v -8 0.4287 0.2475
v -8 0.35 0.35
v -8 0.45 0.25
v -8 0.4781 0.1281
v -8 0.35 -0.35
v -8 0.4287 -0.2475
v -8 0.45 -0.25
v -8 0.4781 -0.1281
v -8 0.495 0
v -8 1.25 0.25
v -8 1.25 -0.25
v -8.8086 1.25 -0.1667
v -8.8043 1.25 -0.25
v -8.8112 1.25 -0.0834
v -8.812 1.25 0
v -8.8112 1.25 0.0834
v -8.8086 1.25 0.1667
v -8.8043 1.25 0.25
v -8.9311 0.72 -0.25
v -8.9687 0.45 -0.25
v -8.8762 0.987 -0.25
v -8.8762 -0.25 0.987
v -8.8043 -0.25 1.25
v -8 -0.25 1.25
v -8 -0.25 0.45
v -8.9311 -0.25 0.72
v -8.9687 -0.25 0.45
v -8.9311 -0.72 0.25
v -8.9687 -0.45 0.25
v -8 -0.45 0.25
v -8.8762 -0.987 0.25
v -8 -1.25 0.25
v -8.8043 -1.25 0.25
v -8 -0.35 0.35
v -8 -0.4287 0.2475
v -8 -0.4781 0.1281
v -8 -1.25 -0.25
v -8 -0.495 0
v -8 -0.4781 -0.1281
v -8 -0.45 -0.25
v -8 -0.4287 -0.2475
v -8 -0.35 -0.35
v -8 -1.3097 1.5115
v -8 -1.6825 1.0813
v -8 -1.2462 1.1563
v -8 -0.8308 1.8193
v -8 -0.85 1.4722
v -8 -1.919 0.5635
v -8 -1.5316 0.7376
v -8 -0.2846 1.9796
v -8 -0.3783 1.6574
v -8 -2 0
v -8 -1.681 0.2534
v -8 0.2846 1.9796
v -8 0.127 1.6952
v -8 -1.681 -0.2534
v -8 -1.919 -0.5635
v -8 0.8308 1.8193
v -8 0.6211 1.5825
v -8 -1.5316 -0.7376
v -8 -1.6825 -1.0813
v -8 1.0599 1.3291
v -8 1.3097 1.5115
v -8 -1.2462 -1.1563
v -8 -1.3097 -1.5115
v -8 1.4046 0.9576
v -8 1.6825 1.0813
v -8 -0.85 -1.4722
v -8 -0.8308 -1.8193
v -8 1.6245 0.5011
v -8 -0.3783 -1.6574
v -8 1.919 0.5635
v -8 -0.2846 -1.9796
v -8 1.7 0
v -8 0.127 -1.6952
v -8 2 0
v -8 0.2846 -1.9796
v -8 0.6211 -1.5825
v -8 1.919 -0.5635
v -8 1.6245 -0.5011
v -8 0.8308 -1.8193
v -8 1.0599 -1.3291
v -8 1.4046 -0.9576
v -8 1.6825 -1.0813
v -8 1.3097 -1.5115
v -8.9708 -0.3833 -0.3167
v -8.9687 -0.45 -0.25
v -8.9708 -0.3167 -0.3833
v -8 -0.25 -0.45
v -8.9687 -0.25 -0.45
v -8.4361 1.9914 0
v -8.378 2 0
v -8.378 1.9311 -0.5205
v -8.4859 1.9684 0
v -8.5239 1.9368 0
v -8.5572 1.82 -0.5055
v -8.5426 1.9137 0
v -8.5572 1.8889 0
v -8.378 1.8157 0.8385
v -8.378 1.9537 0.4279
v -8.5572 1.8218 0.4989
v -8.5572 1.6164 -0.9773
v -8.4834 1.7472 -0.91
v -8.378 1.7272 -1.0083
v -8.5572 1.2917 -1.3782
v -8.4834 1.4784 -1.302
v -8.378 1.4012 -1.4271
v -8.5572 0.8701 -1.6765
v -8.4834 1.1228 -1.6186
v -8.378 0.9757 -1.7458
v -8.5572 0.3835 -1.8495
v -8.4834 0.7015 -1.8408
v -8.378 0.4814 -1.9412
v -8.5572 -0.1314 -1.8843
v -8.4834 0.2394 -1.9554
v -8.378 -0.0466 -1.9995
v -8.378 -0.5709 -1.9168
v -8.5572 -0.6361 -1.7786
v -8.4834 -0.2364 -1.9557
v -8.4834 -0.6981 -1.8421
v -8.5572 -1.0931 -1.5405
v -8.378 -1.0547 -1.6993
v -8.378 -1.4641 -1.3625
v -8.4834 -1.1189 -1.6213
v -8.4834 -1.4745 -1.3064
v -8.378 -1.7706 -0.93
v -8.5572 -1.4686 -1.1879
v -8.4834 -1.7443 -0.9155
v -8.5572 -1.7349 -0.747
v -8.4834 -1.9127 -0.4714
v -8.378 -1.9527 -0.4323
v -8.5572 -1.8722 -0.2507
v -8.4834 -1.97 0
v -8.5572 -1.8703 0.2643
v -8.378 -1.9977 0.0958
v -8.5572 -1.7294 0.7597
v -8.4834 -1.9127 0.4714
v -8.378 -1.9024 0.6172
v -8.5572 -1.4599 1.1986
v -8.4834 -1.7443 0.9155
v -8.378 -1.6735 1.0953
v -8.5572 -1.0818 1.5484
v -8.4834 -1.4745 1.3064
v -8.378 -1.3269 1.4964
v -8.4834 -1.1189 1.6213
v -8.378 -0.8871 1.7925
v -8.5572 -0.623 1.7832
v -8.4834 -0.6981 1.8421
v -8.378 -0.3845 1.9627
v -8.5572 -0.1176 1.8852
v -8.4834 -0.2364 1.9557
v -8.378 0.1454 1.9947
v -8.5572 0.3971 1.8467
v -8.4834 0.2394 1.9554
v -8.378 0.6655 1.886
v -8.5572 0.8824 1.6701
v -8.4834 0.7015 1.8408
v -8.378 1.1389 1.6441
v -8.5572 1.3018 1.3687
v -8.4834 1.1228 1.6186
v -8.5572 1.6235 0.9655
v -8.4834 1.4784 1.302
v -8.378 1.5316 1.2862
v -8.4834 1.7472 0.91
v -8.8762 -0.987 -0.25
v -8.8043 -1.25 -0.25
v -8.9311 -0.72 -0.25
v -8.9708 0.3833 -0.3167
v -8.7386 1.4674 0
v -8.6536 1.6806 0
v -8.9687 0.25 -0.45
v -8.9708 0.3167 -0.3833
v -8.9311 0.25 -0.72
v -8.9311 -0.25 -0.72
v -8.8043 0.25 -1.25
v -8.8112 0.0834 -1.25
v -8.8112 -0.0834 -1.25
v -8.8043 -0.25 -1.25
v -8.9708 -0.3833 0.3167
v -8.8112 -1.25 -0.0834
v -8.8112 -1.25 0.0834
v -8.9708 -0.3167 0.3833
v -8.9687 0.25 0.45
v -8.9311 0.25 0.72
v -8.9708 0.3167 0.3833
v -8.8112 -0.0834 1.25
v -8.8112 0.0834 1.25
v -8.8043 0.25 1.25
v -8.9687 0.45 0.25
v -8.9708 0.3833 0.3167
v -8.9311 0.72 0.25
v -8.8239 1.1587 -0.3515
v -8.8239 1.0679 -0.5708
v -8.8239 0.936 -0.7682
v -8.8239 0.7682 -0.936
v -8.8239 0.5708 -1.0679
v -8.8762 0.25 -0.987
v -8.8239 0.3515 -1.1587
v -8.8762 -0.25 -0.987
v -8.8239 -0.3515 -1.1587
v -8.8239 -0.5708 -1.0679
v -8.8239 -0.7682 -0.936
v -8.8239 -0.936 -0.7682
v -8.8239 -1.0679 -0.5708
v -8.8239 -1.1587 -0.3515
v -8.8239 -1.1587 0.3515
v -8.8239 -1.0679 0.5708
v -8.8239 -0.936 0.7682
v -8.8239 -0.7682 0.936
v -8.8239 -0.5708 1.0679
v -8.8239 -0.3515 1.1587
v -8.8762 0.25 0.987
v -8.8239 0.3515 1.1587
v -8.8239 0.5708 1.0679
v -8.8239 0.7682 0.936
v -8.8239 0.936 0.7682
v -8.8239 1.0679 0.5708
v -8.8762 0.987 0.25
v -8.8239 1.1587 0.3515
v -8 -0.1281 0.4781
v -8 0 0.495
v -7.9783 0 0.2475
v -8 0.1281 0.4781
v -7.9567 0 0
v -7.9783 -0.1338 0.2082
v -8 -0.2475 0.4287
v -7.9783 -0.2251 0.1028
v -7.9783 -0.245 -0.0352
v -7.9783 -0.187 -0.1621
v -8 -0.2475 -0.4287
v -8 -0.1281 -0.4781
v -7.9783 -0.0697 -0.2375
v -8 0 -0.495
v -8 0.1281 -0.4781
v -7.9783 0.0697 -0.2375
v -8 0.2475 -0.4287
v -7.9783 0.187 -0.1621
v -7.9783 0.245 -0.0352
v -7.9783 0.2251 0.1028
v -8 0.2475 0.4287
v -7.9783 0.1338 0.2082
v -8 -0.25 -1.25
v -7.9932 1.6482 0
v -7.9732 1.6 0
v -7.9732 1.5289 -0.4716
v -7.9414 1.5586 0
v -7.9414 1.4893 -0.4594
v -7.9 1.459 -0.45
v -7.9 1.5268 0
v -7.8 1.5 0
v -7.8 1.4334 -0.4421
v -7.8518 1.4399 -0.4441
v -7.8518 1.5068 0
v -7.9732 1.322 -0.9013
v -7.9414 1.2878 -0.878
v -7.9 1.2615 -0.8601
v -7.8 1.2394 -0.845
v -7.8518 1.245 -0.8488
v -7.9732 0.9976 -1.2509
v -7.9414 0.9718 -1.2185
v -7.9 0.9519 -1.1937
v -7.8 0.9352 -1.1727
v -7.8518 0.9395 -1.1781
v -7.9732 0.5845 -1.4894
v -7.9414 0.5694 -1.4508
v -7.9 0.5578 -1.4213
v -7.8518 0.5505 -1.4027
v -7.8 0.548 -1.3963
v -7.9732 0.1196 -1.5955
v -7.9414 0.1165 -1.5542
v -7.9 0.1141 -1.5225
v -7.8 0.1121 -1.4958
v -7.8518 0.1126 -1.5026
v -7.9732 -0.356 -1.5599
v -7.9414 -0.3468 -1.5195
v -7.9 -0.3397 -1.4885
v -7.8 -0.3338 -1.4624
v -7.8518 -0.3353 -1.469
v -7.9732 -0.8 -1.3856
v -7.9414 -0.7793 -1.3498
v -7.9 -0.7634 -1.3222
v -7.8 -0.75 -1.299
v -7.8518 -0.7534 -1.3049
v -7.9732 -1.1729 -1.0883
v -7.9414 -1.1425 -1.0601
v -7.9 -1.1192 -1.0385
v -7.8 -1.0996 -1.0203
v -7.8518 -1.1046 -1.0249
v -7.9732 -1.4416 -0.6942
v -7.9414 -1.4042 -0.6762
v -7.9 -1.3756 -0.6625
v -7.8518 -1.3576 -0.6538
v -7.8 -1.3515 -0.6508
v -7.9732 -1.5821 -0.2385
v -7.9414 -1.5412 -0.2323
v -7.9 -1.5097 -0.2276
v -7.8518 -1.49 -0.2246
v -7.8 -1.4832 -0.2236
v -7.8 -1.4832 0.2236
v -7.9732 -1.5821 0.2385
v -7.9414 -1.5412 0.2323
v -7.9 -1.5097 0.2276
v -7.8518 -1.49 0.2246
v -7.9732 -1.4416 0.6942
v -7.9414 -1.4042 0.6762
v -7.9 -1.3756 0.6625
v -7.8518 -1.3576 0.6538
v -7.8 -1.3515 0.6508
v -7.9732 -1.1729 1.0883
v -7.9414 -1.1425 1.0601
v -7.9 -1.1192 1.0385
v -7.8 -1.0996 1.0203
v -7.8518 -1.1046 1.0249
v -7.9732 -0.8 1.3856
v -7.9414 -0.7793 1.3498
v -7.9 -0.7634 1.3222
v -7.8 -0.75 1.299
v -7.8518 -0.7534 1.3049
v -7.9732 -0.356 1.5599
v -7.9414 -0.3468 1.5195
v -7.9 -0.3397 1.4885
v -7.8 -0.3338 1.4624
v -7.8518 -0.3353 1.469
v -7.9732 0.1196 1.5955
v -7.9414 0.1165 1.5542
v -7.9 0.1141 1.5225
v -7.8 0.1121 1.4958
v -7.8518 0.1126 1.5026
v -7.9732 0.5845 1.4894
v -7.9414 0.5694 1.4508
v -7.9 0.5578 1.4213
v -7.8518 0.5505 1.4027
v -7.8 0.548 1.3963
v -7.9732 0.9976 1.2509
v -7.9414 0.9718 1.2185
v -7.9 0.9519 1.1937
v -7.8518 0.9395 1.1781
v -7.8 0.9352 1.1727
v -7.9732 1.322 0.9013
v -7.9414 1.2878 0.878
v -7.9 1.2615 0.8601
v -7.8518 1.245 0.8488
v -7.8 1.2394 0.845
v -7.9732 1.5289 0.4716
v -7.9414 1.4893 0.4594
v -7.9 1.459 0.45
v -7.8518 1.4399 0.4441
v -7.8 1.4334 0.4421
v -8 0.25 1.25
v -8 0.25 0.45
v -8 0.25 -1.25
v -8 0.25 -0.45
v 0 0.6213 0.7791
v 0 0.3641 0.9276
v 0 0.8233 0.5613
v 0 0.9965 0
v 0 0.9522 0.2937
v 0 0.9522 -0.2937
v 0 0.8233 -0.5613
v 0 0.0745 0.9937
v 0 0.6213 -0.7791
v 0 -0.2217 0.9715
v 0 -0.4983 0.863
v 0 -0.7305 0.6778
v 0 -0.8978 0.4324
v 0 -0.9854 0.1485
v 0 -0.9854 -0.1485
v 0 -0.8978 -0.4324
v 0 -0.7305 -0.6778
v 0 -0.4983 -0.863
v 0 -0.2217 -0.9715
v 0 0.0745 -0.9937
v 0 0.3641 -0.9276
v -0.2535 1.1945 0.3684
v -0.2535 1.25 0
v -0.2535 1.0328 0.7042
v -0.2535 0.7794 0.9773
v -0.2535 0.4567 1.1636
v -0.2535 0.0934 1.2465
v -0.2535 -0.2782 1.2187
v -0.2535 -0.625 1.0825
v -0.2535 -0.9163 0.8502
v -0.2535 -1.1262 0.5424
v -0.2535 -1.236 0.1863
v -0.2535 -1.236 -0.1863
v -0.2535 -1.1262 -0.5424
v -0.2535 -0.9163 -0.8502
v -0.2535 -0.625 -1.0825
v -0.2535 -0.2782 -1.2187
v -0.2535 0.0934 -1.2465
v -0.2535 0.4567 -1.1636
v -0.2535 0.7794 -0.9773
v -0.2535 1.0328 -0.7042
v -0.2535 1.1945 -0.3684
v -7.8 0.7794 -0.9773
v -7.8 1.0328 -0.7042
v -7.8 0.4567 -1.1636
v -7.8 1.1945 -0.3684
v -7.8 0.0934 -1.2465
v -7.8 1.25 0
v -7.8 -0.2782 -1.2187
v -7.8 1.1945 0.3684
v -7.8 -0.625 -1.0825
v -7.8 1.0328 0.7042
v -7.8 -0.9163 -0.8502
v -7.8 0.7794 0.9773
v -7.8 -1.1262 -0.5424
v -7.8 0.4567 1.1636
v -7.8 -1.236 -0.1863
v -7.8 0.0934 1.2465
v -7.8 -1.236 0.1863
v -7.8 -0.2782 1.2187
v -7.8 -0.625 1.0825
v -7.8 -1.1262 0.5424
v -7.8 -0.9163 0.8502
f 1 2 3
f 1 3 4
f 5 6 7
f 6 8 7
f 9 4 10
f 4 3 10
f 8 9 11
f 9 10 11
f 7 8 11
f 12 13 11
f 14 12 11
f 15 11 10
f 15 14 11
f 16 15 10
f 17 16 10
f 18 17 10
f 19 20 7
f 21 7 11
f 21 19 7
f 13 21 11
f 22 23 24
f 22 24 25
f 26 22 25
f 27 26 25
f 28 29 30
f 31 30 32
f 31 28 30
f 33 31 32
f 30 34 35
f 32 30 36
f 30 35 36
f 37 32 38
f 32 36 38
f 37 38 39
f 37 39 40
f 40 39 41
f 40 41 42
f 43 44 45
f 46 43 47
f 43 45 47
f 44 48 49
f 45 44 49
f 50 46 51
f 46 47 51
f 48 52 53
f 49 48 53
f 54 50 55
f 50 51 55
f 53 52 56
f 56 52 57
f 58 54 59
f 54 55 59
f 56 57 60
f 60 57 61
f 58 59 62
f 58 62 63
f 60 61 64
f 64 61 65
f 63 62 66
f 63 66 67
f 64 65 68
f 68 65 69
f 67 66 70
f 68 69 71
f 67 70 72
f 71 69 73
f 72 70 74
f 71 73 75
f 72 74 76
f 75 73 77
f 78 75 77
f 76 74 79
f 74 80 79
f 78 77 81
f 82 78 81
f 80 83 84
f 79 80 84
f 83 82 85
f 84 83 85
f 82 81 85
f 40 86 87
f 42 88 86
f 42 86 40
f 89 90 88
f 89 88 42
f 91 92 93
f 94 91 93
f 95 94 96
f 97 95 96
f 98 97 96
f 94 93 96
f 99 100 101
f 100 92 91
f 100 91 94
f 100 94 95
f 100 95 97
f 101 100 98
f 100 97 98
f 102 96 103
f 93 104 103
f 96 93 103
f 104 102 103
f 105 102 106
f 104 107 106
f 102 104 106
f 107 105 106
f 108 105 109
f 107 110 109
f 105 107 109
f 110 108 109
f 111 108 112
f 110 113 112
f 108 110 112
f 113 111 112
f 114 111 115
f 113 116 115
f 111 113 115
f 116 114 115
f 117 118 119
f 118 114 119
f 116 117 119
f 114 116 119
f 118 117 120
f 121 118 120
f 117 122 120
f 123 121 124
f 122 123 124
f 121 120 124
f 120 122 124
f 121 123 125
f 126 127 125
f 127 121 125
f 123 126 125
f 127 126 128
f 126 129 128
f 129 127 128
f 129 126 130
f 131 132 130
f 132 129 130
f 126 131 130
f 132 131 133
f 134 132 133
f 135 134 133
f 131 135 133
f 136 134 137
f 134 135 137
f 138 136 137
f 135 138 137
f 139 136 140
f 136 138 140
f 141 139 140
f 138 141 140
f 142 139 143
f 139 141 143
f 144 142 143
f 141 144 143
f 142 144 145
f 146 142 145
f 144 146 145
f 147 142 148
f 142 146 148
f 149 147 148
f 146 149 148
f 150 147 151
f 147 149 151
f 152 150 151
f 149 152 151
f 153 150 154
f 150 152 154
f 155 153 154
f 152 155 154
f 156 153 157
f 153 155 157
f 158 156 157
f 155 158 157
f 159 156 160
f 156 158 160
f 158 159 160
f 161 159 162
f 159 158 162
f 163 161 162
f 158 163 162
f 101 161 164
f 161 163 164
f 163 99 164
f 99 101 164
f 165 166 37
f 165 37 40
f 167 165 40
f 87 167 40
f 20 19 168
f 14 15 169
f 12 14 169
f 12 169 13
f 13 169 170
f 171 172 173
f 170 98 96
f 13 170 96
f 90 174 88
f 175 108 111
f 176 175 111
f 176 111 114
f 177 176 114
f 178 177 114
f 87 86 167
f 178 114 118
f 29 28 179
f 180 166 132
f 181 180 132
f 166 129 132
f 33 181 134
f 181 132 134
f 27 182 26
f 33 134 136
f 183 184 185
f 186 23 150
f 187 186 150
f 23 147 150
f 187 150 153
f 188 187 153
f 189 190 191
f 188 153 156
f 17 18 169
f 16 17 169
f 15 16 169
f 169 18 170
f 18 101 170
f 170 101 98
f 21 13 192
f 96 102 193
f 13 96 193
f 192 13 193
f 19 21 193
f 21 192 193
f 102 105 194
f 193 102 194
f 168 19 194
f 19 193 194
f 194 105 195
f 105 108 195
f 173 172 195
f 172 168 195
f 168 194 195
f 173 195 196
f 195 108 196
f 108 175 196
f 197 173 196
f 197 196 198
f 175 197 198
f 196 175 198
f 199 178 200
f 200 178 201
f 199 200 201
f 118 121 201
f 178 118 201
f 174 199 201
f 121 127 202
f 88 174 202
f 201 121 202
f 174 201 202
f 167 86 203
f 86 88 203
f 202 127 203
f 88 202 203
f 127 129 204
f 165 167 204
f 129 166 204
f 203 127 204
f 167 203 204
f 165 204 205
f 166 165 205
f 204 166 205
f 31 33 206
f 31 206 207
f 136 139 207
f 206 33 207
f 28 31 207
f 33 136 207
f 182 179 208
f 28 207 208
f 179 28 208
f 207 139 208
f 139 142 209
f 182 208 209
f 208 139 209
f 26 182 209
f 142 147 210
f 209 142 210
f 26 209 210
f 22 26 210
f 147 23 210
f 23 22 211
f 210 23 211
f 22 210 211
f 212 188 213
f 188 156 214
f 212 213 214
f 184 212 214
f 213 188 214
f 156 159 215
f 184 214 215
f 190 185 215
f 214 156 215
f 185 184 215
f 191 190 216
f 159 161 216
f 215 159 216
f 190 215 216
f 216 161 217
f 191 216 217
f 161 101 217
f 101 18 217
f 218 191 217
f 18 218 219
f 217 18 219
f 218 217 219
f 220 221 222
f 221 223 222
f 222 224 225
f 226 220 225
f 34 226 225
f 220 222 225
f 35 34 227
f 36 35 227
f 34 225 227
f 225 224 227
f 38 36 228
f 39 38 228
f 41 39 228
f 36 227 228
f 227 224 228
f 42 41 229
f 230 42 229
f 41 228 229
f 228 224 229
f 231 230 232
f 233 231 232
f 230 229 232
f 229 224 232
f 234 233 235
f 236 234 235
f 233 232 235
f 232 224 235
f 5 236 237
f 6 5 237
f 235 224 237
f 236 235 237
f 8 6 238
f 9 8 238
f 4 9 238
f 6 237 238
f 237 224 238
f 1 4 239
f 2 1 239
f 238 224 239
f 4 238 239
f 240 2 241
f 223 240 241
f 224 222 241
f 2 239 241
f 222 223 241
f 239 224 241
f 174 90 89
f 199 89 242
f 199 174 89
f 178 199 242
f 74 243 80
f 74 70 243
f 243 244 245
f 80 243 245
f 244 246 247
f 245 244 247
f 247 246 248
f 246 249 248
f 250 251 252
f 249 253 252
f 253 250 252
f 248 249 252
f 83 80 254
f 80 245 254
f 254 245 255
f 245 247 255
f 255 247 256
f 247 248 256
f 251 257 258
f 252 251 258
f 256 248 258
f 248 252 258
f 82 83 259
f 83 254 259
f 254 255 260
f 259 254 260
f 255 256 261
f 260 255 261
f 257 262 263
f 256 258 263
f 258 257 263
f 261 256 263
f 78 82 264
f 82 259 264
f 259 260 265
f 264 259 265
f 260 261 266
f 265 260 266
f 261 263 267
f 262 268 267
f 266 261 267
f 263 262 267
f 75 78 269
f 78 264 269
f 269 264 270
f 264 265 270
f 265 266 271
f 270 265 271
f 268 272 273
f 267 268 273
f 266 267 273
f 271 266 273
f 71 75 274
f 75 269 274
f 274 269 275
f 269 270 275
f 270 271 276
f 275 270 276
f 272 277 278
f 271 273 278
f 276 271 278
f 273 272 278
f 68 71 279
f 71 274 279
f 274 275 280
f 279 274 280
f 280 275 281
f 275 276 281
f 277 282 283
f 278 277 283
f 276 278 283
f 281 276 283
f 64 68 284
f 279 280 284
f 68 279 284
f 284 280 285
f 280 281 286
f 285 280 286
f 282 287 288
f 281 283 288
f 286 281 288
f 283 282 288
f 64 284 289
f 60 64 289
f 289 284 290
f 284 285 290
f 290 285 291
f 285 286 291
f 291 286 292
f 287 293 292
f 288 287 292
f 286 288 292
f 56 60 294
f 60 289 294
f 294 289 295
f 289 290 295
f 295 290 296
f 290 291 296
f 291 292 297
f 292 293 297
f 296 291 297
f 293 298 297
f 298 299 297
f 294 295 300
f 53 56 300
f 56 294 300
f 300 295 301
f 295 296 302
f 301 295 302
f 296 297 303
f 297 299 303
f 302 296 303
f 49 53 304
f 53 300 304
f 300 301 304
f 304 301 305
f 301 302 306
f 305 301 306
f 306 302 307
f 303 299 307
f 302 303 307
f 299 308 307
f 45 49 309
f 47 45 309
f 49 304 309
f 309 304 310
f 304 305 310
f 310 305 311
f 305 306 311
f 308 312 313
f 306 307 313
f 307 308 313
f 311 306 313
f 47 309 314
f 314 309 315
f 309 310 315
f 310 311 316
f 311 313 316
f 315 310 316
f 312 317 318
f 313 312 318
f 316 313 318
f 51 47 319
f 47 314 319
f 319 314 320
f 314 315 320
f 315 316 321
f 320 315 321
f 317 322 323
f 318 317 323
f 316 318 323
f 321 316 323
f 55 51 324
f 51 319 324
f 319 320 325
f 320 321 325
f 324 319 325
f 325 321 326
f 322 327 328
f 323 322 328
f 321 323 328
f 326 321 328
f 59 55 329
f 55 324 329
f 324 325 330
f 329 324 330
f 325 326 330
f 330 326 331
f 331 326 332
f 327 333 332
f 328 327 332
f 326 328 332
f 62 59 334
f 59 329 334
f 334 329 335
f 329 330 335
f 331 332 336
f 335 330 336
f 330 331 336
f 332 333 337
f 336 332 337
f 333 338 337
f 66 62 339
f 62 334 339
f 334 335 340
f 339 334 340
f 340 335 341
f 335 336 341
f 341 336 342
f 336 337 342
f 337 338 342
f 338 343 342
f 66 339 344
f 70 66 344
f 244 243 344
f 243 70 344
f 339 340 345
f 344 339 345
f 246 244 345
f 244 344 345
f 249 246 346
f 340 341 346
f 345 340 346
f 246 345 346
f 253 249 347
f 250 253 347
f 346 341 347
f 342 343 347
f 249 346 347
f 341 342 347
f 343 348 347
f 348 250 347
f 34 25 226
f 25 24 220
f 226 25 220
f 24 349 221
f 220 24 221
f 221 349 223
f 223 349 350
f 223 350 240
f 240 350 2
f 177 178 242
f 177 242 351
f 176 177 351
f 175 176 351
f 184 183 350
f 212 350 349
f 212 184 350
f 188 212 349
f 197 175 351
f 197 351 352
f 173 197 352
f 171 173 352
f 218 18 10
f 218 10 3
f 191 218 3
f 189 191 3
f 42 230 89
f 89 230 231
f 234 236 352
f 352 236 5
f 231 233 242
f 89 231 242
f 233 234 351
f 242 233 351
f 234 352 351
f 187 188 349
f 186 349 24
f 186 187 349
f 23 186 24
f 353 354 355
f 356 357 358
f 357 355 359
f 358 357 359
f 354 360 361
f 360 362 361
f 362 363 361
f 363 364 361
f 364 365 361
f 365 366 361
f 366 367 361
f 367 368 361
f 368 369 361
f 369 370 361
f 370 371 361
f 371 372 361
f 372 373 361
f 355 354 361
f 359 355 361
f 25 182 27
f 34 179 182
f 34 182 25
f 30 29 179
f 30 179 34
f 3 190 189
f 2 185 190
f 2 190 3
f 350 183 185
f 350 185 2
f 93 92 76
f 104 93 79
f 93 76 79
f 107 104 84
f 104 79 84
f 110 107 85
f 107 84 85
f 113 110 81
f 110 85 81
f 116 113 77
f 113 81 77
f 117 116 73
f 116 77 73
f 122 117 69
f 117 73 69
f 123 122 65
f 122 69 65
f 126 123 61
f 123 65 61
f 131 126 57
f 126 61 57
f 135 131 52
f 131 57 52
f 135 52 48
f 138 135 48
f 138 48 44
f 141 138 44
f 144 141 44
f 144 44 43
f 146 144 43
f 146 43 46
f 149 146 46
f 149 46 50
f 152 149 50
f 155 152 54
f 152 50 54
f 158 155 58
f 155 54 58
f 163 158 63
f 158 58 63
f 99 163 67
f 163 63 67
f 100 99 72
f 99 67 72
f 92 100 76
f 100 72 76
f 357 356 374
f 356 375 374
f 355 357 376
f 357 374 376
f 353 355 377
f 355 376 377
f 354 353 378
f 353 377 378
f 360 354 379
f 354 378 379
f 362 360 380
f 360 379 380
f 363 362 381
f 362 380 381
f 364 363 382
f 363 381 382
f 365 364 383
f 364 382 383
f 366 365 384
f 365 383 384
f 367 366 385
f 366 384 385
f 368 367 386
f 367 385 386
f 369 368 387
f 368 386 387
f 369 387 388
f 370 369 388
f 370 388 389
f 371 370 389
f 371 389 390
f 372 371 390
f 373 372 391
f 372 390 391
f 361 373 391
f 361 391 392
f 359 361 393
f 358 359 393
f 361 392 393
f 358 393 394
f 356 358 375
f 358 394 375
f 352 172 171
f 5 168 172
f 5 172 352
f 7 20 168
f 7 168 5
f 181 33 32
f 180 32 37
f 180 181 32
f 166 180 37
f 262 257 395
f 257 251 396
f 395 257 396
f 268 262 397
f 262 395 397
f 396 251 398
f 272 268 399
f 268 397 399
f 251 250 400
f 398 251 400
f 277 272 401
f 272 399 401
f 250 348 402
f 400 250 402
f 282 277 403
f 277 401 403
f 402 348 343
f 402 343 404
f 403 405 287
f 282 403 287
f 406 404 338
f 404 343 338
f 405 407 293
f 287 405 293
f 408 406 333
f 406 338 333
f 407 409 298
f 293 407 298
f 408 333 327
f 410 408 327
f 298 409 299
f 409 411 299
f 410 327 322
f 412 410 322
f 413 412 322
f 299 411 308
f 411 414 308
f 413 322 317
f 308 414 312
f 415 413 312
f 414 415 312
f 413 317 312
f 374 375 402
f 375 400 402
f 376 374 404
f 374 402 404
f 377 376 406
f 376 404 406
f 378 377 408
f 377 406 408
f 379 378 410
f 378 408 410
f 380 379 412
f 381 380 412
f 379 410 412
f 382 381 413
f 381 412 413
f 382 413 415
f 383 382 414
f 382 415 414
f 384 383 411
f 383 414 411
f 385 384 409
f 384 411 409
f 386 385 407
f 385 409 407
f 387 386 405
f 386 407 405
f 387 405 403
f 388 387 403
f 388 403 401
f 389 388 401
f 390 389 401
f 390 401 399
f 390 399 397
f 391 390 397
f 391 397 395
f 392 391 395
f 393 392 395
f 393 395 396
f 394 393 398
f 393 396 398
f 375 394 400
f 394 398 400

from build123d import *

# Parameters (mm, degrees)
ENL_V_MAT_EXTRU_1_DEPTH = 1
CHANFREIN1_SIZE         = 0.2
CONG_1_R                = 0.2
CONG_2_R                = 0.2


# Read off the part's stored shape, not the designer's step: M2.5 Filetages mécaniques Borne3
with BuildPart() as part:
    # Esquisse1 → Révolution1 (revolve)
    with BuildSketch(Plane.XY):
        with BuildLine():
            Line((0, 0), (-9, 0))
            ThreePointArc((-9, 0), (-8.873105626, 1.030776406), (-8.5, 2))
            Line((-8.5, 2), (-8, 2))
            Line((-8, 2), (-8, 1.5))
            Line((-8, 1.5), (0, 1.5))
            Line((0, 1.5), (0, 0))
        make_face()
    revolve(axis=Axis((0, 0, 0), (-1, 0, 0)))

    # Esquisse2 → Enlèv. mat.-Extru.1 (cut)
    with BuildSketch(Plane.ZY.offset(9)):
        Polygon((-0.25, 1.25), (0.25, 1.25), (0.25, 0.25), (1.25, 0.25), (1.25, -0.25), (0.25, -0.25), (0.25, -1.25), (-0.25, -1.25), (-0.25, -0.25), (-1.25, -0.25), (-1.25, 0.25), (-0.25, 0.25), align=None)
    extrude(amount=-ENL_V_MAT_EXTRU_1_DEPTH, mode=Mode.SUBTRACT)

    # Chanfrein1
    chanfrein1_edges = [part.edges().sort_by_distance(p)[0] for p in [
        (-8.492634293, 0.25, 0.25),
        (-8.492634293, -0.25, 0.25),
        (-8.492634293, -0.25, -0.25),
        (-8.492634293, 0.25, -0.25),
    ]]
    chamfer(chanfrein1_edges, length=CHANFREIN1_SIZE)

    # Enlèv. mat.-Extru.3 cone 1 section (through the dimple's axis) → Enlèv. mat.-Extru.3 (revolve, cut)
    with BuildSketch(Plane(origin=(-8, 0, 0), x_dir=(0, 0, 1), z_dir=(0, 1, 0))):
        Polygon((0, 0), (0.494974747, 0), (0, 0.043304679), align=None)
    revolve(axis=Axis((-8, 0, 0), (1, 0, 0)), mode=Mode.SUBTRACT)

    # Congé1
    cong_1_edges = [part.edges().sort_by_distance(p)[0] for p in [
        (-8, -1.5, 0),
    ]]
    fillet(cong_1_edges, radius=CONG_1_R)

    # Congé2
    cong_2_edges = [part.edges().sort_by_distance(p)[0] for p in [
        (-8.5, -2, 0),
    ]]
    fillet(cong_2_edges, radius=CONG_2_R)

    # M2.5 Filetages mécaniques Borne3 outline → M2.5 Filetages mécaniques Borne3 (revolve, cut)
    with BuildSketch(Plane.YX):
        Polygon((1.5, 0), (0.9965, 0), (1.25, -0.2535), (1.25, -7.8), (1.5, -7.8), align=None)
    revolve(axis=Axis((0, 0, 0), (1, 0, 0)), mode=Mode.SUBTRACT)


solid = part.part
